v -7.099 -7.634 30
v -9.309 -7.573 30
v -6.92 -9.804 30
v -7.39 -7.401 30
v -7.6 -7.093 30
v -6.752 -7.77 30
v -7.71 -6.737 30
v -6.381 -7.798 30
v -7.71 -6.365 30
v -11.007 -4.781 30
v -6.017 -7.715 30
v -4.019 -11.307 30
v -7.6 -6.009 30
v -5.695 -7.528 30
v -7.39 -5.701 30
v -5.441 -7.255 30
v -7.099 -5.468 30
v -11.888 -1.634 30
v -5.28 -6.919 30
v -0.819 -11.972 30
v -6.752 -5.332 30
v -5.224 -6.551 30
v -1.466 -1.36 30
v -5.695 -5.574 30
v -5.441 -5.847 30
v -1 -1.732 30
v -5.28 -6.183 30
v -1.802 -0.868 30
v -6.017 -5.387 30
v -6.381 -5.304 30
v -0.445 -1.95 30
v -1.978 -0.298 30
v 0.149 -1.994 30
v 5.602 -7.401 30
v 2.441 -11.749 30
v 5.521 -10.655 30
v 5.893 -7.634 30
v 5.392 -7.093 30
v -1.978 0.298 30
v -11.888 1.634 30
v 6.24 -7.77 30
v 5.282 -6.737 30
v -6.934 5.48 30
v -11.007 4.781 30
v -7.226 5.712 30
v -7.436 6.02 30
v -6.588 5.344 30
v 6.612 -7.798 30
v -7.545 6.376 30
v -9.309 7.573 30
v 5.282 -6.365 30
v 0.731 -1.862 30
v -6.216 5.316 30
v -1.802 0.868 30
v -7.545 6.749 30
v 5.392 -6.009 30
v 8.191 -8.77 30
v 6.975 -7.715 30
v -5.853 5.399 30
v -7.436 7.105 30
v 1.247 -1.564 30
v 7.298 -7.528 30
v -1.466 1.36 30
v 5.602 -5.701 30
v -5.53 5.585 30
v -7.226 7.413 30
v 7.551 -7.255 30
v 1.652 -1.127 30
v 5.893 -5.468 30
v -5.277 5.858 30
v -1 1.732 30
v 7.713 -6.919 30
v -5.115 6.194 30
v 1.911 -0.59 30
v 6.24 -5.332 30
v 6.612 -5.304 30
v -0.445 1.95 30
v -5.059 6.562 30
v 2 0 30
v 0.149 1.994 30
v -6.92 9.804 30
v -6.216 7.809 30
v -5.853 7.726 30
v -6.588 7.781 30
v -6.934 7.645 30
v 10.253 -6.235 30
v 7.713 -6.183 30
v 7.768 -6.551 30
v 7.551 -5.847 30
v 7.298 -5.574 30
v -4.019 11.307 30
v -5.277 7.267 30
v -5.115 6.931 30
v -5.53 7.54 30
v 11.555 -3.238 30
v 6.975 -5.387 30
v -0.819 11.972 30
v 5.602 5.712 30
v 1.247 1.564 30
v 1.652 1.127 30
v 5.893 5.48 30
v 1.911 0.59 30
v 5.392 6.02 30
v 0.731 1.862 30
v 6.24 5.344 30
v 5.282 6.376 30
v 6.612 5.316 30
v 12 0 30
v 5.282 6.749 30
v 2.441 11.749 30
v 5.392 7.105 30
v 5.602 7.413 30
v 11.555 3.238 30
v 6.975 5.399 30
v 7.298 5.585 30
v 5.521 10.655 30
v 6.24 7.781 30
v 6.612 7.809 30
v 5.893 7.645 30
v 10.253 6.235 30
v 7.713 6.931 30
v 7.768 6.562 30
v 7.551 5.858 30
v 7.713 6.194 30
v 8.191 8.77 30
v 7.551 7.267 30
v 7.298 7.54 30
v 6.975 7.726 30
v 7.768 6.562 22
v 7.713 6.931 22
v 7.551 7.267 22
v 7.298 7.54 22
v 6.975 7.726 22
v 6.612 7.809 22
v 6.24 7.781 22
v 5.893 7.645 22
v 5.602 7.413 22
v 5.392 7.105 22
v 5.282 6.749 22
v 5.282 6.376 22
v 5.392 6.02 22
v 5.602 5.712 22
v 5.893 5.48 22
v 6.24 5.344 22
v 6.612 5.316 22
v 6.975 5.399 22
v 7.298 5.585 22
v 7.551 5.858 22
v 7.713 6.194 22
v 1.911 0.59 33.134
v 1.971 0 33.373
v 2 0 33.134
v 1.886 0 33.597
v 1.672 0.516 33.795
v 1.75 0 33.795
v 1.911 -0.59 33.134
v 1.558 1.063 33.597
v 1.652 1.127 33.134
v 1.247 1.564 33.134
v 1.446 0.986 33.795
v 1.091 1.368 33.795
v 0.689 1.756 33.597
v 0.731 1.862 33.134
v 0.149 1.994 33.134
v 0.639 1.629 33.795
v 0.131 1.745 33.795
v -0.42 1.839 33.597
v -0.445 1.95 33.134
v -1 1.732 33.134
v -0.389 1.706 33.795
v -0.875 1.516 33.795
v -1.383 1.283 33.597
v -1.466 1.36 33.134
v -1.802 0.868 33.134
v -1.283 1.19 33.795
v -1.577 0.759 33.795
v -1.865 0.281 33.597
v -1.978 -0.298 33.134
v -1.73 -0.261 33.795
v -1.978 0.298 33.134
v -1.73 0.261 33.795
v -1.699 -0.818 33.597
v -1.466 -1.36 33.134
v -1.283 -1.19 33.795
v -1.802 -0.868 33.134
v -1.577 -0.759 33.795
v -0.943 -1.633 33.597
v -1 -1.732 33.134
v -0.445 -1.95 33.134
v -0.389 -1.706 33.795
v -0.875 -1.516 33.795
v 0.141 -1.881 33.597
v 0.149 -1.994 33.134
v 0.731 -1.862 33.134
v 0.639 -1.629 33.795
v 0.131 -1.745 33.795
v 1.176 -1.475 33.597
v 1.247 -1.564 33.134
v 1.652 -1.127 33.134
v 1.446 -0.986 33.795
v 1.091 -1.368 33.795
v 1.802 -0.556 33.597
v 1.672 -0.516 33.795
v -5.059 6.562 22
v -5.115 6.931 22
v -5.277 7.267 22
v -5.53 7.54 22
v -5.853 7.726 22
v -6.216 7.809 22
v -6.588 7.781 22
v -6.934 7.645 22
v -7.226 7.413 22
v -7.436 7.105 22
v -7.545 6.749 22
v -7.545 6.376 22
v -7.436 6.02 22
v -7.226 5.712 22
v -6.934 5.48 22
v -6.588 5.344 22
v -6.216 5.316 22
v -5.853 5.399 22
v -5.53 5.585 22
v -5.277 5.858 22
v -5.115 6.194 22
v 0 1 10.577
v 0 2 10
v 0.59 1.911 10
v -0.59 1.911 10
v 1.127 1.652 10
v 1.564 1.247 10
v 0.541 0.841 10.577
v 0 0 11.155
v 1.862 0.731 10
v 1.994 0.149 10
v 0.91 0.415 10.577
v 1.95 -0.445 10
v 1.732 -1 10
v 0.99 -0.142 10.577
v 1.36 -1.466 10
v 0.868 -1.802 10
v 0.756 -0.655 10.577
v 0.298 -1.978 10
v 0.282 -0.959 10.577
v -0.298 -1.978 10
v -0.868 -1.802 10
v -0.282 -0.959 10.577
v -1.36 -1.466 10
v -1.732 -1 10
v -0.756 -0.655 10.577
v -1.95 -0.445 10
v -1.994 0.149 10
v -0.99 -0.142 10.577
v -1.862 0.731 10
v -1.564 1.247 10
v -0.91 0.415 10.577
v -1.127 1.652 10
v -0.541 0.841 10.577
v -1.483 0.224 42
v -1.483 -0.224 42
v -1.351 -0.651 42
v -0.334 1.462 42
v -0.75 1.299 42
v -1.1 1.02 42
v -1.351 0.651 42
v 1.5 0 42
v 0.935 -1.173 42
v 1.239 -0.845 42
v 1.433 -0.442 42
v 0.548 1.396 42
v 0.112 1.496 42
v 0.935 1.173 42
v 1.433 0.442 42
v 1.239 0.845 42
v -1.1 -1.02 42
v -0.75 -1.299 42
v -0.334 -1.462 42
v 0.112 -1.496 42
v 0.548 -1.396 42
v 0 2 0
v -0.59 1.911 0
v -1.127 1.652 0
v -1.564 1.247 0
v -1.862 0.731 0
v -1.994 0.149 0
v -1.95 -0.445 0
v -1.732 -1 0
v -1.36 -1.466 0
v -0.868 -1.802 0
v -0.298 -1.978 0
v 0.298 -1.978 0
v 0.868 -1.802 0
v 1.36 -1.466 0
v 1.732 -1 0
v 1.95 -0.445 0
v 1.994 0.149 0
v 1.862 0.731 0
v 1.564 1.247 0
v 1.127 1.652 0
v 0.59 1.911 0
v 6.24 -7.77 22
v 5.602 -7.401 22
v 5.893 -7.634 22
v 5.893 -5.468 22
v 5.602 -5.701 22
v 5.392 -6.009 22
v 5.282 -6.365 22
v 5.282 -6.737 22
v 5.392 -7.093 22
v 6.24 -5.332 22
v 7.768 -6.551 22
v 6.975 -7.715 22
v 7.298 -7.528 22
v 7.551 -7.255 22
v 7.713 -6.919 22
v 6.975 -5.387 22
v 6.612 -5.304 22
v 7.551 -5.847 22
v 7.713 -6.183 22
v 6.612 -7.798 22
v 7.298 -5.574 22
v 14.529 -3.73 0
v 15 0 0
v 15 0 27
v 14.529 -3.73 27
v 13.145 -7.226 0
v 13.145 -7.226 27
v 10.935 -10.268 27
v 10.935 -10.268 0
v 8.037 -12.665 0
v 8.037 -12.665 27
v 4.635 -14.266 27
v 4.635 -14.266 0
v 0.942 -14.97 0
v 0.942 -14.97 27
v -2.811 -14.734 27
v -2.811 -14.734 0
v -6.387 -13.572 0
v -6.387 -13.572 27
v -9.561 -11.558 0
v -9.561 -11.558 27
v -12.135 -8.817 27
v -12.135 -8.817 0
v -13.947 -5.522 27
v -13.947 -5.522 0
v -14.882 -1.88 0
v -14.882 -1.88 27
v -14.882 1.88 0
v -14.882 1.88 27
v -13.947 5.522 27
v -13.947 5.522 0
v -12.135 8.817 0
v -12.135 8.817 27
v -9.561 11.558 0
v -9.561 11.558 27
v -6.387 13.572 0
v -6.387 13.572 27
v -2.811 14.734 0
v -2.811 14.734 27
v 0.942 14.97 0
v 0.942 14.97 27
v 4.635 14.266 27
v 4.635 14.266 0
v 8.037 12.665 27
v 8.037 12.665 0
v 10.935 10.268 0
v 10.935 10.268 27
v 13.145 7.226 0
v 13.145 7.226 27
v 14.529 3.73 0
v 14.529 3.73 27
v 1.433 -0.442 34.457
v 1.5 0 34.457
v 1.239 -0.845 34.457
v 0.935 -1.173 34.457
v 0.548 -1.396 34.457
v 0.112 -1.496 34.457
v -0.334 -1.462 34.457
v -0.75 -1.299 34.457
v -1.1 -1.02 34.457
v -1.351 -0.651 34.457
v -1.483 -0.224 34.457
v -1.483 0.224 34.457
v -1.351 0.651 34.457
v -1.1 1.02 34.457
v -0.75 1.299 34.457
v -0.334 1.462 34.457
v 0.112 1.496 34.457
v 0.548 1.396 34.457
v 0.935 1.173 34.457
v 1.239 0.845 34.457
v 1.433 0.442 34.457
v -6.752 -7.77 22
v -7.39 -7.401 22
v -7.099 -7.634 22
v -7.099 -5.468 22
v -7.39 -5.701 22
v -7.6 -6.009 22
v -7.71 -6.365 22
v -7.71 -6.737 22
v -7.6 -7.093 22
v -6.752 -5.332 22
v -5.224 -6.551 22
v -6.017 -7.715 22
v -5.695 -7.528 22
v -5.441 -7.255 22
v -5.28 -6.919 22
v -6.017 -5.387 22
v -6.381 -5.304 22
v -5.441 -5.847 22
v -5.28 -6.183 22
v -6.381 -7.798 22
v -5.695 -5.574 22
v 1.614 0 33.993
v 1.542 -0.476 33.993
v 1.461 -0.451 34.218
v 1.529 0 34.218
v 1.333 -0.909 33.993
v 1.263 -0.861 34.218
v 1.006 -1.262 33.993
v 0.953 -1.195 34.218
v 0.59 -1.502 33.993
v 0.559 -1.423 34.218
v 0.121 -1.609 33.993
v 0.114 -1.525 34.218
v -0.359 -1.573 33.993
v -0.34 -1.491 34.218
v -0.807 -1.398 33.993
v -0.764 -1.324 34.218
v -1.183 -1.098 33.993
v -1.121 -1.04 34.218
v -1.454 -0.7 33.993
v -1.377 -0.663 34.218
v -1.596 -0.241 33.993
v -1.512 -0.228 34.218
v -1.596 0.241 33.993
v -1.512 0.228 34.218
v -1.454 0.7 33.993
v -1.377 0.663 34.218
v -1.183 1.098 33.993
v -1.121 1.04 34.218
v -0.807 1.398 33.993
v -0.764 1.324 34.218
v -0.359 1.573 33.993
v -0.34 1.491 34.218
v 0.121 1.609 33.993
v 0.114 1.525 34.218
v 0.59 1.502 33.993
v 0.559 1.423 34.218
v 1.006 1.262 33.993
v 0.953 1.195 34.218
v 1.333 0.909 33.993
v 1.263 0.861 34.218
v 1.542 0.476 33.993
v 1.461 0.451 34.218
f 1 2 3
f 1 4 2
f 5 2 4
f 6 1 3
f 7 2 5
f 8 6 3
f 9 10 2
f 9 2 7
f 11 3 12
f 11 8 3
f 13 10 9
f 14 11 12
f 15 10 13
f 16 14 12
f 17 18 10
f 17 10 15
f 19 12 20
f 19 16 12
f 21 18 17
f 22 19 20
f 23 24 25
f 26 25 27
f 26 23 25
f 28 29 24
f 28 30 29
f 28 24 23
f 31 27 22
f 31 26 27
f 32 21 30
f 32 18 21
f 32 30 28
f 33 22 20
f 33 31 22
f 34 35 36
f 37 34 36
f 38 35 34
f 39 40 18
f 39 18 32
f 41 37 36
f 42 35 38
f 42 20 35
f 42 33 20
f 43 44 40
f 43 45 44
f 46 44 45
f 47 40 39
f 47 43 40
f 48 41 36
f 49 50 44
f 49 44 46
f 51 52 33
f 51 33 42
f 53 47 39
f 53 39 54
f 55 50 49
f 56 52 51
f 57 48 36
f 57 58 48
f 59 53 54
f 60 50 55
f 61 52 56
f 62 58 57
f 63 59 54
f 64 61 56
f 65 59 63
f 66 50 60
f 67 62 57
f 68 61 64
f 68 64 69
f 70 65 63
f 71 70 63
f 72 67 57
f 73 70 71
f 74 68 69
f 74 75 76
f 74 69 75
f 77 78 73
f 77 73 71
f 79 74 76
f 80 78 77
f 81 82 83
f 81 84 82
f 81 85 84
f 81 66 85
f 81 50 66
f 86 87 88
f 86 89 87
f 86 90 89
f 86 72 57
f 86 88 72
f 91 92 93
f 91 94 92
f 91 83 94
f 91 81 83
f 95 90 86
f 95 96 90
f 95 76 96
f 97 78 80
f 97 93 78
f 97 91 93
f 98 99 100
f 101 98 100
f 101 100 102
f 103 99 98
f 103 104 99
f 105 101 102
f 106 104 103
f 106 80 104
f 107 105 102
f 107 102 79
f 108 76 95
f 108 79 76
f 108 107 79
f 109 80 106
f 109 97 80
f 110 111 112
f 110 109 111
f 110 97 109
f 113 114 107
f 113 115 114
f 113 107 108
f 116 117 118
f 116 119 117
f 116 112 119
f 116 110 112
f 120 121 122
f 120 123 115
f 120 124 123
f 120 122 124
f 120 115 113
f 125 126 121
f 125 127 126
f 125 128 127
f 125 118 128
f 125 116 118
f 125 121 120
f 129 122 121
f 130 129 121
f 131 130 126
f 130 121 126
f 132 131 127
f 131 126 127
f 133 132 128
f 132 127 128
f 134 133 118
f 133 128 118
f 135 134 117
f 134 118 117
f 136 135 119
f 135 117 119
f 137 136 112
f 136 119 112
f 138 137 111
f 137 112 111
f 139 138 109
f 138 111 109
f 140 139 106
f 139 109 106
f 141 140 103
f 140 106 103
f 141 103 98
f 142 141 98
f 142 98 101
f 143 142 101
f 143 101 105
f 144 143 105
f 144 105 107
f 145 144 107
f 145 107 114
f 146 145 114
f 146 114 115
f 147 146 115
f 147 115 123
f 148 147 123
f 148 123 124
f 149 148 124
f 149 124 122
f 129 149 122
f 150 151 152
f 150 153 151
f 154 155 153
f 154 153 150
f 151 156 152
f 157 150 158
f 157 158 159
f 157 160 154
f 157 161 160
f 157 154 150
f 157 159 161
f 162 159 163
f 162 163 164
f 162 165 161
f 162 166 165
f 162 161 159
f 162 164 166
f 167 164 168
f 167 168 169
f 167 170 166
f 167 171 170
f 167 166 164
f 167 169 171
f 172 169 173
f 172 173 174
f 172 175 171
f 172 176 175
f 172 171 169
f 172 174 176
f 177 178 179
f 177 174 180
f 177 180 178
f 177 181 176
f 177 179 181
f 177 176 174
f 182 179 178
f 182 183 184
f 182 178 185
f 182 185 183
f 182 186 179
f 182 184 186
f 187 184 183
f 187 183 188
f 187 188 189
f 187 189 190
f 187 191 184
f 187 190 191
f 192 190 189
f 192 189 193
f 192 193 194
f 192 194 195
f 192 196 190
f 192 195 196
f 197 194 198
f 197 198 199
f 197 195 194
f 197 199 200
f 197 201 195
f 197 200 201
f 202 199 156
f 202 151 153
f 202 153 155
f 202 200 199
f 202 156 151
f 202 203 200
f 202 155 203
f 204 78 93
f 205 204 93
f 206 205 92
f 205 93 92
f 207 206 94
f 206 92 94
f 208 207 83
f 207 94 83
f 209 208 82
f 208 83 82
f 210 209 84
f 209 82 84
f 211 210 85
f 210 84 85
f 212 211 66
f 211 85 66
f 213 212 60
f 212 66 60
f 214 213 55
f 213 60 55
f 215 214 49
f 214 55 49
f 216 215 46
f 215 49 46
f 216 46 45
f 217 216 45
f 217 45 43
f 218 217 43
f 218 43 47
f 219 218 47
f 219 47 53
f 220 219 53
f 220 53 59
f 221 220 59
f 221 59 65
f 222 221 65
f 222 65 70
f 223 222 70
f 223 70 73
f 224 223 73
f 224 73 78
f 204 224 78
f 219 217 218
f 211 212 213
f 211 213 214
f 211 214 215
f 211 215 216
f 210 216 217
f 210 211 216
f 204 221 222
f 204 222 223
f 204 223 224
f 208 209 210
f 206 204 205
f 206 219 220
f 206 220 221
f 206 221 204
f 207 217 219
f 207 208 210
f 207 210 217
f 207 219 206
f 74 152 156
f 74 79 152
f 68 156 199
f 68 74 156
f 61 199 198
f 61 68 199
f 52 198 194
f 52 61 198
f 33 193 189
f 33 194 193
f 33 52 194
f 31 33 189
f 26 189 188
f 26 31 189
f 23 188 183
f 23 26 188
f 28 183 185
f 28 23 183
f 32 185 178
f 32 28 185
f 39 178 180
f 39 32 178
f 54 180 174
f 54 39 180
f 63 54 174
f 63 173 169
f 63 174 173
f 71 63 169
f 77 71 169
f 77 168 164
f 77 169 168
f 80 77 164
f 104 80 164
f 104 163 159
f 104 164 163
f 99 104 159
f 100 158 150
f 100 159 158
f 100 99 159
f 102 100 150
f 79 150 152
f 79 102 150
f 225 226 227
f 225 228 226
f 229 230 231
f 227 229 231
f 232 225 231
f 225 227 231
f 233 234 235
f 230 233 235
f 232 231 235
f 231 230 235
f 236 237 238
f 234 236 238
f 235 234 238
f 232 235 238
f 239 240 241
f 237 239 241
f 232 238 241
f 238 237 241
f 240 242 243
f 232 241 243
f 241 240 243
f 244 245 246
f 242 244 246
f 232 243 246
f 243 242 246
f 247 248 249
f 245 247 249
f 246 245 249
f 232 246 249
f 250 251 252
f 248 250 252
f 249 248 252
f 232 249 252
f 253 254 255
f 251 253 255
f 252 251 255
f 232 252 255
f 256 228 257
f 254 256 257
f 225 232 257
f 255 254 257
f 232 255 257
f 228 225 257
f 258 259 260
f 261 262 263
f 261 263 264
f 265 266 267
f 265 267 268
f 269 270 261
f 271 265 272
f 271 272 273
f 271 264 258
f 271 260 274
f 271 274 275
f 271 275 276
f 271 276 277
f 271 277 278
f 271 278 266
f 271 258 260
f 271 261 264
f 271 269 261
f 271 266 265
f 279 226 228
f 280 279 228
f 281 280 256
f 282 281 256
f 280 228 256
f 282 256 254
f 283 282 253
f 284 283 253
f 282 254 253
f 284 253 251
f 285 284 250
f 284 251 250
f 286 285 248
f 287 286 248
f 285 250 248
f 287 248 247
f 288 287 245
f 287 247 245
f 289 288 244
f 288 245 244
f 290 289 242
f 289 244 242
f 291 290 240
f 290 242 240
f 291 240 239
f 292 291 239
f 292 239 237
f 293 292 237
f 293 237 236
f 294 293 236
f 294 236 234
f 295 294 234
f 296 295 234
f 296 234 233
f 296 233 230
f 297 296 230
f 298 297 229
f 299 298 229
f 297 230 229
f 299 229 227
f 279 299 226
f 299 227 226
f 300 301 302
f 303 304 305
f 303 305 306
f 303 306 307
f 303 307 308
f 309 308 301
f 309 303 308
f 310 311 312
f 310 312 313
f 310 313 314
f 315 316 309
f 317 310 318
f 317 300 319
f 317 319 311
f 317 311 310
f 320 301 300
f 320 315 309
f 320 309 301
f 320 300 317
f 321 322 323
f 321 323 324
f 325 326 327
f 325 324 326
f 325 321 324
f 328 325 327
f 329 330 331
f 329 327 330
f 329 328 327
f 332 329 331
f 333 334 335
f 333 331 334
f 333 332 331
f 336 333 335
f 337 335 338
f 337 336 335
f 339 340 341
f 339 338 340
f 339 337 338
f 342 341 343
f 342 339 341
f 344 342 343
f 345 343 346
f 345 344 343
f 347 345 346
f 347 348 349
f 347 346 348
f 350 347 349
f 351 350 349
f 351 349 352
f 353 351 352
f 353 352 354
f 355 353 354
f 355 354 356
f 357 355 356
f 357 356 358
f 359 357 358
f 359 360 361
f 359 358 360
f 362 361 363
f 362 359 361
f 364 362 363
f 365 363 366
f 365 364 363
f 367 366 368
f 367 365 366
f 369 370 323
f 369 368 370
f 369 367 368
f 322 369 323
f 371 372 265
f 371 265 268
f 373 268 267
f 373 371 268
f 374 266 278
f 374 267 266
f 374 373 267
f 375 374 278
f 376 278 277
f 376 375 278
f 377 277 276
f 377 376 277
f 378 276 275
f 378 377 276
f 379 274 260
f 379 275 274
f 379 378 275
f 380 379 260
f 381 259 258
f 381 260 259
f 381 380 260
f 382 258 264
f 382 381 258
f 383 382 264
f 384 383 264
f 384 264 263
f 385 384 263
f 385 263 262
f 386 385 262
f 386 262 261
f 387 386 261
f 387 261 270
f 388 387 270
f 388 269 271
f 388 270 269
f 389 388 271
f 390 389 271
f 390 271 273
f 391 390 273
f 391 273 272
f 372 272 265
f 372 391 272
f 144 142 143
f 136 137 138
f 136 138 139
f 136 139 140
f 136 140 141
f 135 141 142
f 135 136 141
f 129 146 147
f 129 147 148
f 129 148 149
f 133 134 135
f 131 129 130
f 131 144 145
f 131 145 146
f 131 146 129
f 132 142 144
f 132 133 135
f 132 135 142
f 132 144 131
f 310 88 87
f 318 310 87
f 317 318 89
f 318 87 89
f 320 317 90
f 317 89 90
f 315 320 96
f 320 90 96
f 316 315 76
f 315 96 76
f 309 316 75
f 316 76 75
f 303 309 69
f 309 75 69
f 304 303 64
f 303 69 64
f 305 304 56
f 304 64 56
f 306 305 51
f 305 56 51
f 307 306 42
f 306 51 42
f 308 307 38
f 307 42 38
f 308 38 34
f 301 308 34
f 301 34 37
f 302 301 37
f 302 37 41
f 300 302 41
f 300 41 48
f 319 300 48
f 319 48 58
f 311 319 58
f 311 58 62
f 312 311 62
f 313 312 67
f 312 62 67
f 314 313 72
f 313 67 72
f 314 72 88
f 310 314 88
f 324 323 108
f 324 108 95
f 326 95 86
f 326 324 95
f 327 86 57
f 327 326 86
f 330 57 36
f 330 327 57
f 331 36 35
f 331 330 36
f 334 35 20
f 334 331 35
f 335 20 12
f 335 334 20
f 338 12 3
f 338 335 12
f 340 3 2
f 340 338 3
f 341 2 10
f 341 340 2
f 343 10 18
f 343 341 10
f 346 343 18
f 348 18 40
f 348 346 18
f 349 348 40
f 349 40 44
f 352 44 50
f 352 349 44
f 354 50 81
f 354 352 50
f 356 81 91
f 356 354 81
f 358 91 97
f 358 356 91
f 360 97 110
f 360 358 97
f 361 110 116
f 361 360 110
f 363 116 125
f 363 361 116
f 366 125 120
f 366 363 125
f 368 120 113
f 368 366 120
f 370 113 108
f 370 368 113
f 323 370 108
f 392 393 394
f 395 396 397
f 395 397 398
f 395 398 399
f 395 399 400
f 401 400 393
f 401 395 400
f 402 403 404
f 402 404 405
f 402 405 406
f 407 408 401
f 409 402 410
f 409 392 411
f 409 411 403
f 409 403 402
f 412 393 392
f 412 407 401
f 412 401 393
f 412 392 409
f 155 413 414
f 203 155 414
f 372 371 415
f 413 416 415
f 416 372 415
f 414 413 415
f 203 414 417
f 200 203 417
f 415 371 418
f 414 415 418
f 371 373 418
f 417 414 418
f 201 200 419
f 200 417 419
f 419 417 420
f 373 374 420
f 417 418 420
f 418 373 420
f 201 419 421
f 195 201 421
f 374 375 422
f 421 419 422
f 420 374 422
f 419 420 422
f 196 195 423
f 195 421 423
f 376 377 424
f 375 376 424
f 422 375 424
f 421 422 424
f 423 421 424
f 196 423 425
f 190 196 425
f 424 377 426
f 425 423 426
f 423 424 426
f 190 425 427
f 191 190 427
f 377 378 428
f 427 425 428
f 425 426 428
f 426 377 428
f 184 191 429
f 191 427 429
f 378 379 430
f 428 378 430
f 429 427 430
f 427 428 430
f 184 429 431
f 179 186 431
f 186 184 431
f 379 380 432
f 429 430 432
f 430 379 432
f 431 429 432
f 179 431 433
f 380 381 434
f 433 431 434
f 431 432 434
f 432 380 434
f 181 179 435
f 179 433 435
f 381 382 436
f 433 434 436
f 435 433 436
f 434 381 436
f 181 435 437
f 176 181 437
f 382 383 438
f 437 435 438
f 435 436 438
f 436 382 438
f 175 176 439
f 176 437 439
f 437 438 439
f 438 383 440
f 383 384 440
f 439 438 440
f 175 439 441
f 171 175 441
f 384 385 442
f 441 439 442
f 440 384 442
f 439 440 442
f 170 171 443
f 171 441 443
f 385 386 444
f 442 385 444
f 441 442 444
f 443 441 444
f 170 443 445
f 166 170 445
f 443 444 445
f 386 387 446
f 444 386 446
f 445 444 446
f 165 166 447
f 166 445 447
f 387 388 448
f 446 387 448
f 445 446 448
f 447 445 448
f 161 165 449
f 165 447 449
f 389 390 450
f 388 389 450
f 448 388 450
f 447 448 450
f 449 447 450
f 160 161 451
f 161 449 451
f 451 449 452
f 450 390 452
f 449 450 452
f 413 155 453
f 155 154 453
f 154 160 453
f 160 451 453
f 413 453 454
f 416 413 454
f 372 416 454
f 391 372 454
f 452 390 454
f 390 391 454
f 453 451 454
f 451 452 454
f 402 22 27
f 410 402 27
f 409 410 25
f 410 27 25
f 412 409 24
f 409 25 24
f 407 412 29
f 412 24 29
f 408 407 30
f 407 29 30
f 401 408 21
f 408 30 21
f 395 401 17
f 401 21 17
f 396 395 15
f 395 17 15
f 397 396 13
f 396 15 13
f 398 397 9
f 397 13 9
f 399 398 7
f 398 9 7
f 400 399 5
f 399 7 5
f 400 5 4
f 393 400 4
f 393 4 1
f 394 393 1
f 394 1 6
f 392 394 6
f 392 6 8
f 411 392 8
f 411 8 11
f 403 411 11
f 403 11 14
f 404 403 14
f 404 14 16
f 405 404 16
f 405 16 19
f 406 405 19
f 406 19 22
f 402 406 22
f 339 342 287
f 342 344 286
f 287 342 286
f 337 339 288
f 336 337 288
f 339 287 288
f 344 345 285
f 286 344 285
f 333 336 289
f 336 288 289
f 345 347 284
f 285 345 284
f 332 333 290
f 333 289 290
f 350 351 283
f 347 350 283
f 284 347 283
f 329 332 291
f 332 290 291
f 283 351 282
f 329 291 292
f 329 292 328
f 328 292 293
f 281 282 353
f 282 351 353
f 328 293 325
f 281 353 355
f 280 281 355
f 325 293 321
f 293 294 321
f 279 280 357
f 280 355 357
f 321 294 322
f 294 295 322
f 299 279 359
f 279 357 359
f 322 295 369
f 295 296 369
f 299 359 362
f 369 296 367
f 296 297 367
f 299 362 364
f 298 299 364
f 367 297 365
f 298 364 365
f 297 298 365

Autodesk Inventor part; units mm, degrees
ref_plane "YZ Plane" through (0, 0, 0) normal (1, 0, 0) x (0, 1, 0)
ref_plane "XZ Plane" through (0, 0, 0) normal (0, 1, 0) x (-1, 0, 0)
ref_plane "XY Plane" through (0, 0, 0) normal (0, 0, 1) x (1, 0, 0)
sketch "Sketch1" plane through (0, 0, 0) normal (0, 0, 1) x (1, 0, 0)
  circle A0 centre (0, 0) radius 15
extrude "Extrusion1" add sketch "Sketch1" along normal blind 30
chamfer "Chamfer1" distance 3 angle 45 1 edges at (-15, 0, 30)
sketch "Sketch2" plane through (0, 0, 30) normal (0, 0, 1) x (1, 0, 0)
  circle A0 centre (0, 0) radius 2
extrude "Extrusion2" add sketch "Sketch2" along normal blind 4
sketch "Sketch3" plane through (0, 0, 34) normal (0, 0, 1) x (1, 0, 0)
  circle A0 centre (0, 0) radius 1.5
extrude "Extrusion3" add sketch "Sketch3" along normal blind 8
fillet "Fillet1" radius 1 2 edges at (-2, 0, 34) (-1.5, 0, 34)
sketch "Sketch4" plane through (0, 0, 30) normal (0, 0, 1) x (1, 0, 0)
  point P0 (0, 0)
sketch "Sketch5" plane through (0, 0, 30) normal (0, 0, 1) x (1, 0, 0)
  circle A0 centre (0, 0) radius 12 projected
  circle A1 centre (6.5184, -6.551) radius 1.25
  circle A2 centre (-6.3094, 6.5625) radius 1.25
  circle A3 centre (6.5184, 6.5625) radius 1.25
  circle A4 centre (-6.4741, -6.551) radius 1.25
extrude "Extrusion4" cut sketch "Sketch5" against normal blind 8 contours A1 | A2 | A3 | A4
sketch "Sketch6" plane through (0, 0, 0) normal (0, 0, -1) x (-1, 0, 0)
  point P0 (0, 0)
hole "Hole1" at (0, 0, 0) direction (0, 0, 1) diameter 4 depth 10 tip angle 120
properties part number "DCMotorv2"
